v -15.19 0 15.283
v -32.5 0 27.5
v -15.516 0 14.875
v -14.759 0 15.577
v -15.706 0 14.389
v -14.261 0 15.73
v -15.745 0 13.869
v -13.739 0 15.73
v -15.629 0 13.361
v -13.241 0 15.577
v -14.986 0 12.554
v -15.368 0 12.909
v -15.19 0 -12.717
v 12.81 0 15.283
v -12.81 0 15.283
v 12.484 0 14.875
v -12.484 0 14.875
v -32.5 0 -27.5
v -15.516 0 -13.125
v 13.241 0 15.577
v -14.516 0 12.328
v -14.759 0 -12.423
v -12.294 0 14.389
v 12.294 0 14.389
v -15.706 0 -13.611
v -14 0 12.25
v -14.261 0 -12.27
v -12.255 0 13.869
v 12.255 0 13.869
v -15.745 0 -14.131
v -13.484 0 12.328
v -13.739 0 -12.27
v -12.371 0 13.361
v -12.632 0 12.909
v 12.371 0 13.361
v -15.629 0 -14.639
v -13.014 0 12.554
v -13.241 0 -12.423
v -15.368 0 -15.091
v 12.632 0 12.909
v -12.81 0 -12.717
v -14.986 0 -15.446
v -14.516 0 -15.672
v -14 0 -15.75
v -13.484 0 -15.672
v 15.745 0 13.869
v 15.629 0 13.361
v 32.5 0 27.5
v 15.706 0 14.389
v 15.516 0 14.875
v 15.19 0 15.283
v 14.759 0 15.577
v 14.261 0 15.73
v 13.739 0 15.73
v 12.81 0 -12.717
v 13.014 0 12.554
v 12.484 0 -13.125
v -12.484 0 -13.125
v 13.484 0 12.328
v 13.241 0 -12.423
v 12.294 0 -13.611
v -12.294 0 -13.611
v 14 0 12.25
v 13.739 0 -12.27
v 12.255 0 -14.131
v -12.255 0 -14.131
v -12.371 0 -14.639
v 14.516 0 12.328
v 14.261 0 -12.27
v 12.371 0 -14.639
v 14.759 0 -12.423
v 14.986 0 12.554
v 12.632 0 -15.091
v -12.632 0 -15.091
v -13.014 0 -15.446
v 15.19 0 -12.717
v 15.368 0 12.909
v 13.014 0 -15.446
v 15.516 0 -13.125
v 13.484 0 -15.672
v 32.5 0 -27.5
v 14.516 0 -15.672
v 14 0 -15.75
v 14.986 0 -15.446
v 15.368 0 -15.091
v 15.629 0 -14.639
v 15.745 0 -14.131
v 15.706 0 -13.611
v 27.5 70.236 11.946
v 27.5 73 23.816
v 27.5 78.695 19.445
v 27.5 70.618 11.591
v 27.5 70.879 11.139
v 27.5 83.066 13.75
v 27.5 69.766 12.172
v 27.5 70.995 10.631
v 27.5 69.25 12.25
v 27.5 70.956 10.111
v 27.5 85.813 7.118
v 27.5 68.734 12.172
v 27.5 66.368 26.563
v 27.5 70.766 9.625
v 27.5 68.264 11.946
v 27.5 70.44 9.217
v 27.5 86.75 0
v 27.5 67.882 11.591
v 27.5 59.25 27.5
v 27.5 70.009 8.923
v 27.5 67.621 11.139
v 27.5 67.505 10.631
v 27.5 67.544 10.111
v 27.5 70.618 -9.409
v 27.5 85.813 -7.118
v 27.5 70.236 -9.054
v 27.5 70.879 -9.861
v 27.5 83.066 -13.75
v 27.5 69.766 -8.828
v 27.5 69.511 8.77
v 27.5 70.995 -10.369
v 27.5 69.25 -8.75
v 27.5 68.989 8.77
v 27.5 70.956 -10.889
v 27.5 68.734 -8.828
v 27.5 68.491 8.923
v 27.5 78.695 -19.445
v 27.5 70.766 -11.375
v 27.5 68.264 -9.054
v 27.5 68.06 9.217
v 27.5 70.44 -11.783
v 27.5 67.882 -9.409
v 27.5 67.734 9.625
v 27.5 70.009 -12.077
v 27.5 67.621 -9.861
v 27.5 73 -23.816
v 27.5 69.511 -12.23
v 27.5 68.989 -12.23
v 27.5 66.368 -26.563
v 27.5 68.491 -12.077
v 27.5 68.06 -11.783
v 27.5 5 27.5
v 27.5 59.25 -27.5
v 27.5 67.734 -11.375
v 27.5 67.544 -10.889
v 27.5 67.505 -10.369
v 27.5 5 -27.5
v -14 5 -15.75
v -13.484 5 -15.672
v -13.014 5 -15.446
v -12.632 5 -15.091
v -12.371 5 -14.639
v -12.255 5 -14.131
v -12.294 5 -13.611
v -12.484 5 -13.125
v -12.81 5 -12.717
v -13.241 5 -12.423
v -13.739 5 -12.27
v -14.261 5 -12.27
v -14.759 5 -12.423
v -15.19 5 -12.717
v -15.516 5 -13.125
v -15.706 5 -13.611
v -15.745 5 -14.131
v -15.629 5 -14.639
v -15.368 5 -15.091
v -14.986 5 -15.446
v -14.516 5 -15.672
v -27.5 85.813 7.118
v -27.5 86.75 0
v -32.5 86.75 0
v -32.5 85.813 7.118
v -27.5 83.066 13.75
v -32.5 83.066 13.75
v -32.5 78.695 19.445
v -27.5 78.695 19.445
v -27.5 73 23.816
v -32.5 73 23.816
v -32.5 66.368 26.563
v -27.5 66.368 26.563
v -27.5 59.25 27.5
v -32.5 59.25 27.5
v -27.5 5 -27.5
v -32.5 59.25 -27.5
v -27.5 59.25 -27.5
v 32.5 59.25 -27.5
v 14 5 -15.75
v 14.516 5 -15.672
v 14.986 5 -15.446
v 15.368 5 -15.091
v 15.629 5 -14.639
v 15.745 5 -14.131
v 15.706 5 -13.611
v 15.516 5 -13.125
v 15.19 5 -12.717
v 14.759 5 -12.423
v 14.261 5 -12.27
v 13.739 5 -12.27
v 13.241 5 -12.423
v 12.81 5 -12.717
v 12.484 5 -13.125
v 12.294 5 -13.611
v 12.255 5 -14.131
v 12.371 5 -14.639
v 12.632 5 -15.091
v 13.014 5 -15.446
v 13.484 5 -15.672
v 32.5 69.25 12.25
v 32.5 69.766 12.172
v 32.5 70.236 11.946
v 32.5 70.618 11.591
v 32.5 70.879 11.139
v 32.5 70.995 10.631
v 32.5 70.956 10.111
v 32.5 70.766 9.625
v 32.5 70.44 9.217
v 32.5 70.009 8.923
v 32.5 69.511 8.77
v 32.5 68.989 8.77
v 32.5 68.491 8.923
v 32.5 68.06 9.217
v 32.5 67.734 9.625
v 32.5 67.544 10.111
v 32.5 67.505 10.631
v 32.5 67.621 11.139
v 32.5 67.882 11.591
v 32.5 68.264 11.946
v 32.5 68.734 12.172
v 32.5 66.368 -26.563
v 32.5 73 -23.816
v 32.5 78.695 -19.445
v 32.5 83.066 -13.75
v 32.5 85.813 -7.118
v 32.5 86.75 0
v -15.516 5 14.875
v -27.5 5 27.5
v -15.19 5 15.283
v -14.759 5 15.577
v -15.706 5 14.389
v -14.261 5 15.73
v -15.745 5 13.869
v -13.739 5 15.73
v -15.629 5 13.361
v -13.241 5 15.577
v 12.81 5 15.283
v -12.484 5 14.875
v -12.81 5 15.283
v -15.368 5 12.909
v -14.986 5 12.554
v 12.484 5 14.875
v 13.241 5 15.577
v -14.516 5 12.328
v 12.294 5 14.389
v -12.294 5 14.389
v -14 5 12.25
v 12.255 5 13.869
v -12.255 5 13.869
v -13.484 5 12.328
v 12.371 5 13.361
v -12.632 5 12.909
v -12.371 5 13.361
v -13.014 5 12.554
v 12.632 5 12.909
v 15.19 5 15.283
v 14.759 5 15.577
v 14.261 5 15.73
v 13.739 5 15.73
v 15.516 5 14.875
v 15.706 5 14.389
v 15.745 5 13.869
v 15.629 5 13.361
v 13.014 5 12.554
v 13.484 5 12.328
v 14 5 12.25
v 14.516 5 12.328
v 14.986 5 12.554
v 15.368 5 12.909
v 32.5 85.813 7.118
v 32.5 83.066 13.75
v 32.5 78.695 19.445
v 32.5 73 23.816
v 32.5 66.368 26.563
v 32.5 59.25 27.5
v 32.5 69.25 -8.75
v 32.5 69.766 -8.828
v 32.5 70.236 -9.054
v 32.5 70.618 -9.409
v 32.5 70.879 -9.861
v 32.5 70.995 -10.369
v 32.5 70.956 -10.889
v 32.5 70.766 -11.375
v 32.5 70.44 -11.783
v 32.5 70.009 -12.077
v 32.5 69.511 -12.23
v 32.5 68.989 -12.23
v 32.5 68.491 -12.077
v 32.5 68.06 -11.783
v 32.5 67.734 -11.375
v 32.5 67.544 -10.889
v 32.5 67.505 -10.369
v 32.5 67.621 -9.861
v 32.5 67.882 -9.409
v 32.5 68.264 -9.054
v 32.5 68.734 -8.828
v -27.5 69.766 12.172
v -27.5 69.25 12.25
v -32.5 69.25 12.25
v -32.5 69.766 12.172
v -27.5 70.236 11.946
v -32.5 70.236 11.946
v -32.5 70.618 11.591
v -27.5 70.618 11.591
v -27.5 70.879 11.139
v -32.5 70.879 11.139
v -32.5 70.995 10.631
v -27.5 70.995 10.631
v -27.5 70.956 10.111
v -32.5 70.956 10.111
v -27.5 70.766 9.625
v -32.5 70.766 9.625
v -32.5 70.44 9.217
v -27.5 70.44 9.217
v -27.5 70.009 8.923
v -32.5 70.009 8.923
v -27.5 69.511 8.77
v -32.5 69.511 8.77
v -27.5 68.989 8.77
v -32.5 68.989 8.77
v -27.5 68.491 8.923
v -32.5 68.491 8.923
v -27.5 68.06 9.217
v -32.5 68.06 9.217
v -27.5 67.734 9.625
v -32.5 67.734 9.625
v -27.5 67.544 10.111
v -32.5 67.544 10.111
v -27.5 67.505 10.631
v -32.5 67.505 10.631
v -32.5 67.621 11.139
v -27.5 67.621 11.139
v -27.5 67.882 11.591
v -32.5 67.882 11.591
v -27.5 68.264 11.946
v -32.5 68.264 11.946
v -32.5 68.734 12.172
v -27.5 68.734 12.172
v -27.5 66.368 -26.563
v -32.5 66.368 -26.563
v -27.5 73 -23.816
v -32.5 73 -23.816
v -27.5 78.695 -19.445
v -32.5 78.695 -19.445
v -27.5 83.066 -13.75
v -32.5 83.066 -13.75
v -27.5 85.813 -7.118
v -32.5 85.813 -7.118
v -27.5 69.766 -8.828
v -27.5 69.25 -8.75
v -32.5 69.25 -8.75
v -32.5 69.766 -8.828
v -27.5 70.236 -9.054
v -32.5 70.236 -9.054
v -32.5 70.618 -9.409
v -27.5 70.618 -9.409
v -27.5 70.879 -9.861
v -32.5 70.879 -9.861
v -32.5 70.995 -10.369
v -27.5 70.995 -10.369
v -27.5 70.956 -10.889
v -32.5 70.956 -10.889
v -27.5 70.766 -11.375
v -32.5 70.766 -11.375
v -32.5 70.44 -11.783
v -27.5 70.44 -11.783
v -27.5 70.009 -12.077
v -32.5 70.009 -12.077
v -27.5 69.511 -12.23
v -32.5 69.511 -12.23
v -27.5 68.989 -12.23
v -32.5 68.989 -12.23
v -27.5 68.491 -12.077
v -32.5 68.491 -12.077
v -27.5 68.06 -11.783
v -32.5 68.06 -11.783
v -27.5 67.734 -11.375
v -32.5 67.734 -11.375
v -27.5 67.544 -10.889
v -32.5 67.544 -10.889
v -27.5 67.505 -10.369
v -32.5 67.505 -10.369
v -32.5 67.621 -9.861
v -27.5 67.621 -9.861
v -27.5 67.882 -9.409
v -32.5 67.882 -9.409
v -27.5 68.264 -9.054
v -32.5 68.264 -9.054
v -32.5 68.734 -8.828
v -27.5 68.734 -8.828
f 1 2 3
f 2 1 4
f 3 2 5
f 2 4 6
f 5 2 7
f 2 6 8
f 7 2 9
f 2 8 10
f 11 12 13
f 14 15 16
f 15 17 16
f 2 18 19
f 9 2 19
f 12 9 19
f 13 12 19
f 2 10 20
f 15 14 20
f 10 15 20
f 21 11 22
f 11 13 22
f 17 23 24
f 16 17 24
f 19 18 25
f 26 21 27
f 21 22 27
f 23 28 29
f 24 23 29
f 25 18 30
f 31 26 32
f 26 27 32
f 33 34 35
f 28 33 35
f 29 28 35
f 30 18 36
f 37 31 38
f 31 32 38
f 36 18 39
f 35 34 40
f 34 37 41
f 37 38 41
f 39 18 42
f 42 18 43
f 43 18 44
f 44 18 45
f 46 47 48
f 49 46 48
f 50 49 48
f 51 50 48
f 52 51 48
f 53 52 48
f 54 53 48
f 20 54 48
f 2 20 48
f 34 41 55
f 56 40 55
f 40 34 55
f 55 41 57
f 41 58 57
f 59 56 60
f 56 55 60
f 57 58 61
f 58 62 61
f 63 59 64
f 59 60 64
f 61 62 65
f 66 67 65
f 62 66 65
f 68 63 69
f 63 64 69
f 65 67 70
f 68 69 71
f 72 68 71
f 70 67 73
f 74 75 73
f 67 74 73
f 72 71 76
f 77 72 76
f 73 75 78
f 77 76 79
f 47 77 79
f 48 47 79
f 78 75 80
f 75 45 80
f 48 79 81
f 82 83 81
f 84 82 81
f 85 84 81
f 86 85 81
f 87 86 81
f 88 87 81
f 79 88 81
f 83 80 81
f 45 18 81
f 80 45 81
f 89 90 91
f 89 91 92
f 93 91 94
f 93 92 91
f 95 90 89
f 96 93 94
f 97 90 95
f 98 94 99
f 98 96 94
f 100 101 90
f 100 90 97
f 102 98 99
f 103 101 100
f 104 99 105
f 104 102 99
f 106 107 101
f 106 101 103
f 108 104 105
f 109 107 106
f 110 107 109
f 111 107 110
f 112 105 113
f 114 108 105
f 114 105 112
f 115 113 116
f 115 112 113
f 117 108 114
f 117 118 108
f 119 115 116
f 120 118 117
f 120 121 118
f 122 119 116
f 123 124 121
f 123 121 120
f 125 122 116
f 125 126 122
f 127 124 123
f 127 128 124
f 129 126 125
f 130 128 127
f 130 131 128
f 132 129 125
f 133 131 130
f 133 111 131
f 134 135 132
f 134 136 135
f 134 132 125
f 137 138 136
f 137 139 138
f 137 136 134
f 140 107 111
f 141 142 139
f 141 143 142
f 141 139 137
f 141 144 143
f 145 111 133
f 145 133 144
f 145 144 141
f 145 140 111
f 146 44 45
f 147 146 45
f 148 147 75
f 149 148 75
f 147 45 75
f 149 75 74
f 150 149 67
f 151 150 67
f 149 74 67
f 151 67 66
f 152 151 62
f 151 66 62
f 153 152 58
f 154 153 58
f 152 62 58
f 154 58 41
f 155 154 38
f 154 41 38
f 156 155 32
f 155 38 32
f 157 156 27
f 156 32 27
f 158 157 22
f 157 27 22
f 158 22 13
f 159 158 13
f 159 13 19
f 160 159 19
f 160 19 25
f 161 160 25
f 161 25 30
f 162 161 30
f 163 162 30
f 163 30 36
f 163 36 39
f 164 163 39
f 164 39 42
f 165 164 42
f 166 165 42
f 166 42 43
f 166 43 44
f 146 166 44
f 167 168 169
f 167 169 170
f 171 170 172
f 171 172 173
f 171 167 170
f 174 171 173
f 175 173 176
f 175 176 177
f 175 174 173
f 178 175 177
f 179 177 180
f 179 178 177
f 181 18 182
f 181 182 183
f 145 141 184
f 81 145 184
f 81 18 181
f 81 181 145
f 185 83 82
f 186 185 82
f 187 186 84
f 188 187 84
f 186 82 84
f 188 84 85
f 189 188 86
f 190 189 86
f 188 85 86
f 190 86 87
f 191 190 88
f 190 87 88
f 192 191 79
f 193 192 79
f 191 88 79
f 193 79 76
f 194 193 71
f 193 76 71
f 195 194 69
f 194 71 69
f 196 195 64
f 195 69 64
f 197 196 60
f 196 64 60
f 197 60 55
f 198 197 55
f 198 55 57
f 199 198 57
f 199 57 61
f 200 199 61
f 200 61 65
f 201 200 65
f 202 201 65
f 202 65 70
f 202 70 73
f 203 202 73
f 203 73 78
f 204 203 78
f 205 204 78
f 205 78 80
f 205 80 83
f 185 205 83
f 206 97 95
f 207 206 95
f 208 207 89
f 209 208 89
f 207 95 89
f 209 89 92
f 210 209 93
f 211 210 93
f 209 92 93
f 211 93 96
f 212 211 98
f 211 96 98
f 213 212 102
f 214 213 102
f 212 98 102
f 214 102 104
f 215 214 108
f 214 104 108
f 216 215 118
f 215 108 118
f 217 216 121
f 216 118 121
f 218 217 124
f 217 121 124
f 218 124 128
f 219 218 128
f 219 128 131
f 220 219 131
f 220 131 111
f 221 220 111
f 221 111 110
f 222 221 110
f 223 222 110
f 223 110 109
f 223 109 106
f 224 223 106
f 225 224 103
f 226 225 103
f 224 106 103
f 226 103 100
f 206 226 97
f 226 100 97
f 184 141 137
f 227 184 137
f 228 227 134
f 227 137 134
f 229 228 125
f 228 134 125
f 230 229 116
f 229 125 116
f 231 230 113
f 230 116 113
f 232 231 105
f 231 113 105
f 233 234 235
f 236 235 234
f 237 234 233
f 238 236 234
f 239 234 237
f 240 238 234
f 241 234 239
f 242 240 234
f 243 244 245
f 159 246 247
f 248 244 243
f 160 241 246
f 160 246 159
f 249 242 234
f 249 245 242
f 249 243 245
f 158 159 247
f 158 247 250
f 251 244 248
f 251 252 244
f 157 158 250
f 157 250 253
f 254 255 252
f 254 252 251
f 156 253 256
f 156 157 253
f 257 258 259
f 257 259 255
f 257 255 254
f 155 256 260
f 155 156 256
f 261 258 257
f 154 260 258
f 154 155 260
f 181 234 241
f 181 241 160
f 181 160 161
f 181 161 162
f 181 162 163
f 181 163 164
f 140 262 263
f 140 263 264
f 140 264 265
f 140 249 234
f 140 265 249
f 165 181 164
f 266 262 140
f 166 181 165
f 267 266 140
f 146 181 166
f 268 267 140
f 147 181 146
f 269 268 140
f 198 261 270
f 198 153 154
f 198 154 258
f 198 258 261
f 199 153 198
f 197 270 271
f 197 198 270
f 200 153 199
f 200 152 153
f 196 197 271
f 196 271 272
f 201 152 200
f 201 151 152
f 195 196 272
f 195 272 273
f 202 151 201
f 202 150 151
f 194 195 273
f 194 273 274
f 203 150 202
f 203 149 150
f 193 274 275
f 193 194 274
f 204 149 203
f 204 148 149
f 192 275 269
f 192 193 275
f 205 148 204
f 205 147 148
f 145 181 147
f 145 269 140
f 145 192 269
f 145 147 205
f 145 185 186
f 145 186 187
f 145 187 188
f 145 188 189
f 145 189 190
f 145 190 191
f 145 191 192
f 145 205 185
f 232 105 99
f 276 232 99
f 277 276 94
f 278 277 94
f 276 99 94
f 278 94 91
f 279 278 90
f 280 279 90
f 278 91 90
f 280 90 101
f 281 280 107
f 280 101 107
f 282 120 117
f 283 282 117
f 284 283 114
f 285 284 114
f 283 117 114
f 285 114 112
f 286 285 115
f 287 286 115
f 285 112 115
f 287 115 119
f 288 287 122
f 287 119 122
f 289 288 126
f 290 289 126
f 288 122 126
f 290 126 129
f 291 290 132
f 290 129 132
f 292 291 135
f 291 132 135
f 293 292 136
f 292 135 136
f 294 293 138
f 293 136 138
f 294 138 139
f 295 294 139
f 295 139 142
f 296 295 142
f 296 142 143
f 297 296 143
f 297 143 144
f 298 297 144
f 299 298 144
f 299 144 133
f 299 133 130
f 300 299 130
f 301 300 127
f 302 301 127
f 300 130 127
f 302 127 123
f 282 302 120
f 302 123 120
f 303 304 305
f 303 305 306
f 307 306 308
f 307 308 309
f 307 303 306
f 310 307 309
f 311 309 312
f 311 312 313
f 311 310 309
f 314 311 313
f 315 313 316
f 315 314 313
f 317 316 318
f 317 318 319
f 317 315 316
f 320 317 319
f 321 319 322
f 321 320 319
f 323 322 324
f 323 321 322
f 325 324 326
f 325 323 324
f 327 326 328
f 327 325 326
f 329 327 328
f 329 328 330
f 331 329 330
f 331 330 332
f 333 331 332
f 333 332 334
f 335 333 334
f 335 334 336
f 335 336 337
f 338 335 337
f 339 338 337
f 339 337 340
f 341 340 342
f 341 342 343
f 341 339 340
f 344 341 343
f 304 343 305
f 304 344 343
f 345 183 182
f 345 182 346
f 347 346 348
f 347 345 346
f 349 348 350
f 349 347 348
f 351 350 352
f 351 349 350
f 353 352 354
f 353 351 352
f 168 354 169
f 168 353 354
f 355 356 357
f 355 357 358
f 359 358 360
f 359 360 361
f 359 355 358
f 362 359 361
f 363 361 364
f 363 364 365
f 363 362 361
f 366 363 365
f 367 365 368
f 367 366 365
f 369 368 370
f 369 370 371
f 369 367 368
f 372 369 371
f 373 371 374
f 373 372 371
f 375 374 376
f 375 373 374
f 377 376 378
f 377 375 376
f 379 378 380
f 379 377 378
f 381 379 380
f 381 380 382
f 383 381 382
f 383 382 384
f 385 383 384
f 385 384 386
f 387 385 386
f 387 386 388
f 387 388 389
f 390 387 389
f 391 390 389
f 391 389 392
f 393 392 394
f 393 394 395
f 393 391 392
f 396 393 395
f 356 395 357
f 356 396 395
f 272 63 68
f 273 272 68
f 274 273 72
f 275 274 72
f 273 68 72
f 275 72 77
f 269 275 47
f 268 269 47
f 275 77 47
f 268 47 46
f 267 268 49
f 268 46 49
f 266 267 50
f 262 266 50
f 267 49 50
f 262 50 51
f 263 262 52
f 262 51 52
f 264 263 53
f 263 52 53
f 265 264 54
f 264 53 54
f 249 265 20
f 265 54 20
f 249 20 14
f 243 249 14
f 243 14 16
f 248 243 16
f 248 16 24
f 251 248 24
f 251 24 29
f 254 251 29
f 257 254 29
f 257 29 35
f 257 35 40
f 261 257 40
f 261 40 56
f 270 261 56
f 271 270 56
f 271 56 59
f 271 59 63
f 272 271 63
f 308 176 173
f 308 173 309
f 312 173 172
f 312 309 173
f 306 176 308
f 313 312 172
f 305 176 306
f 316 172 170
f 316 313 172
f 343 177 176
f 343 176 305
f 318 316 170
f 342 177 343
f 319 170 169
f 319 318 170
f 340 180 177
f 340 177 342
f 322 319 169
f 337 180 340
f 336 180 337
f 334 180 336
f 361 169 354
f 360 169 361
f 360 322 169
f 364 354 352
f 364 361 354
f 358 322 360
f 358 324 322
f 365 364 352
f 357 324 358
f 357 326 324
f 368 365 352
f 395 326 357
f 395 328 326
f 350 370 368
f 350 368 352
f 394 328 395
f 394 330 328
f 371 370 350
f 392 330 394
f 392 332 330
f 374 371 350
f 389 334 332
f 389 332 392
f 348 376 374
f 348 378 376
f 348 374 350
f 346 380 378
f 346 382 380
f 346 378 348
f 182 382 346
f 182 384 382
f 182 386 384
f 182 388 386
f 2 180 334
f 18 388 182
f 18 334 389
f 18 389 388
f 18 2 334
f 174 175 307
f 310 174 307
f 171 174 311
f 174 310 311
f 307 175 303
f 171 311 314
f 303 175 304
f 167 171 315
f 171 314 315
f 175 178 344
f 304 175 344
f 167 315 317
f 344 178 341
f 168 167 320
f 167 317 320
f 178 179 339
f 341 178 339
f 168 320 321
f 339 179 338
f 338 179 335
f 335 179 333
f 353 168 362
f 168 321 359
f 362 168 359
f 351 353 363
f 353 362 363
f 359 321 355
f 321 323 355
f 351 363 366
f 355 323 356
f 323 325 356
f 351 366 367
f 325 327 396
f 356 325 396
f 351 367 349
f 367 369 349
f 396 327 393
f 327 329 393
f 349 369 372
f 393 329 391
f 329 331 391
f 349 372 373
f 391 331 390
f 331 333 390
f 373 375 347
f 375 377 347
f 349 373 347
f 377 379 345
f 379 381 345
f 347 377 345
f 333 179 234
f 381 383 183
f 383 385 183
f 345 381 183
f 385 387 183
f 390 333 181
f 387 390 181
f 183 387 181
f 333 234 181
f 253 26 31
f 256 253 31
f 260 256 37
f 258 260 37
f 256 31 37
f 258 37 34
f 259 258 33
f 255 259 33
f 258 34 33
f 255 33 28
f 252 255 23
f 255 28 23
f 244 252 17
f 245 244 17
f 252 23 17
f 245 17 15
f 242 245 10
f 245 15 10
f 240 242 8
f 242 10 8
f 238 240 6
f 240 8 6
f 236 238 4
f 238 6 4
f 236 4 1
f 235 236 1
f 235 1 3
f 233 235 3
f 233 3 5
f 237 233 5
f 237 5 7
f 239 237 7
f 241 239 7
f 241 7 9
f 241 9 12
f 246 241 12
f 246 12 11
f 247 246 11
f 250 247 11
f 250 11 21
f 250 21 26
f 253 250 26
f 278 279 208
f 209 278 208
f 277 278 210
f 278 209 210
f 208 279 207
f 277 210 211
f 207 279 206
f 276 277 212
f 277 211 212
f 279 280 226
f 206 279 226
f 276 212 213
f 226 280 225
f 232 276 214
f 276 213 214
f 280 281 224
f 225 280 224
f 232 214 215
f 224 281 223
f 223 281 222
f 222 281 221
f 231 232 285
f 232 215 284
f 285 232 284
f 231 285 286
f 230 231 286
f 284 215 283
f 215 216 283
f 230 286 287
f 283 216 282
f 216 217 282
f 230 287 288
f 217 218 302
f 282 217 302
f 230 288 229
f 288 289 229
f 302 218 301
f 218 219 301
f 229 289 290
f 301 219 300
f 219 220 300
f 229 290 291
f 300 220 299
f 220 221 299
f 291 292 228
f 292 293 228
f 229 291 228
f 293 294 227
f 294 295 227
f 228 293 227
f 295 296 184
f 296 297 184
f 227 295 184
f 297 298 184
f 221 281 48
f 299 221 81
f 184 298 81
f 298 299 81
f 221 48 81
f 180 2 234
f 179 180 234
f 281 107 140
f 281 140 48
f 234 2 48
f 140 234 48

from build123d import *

# Parameters (mm, degrees)
SKETCH1_W           = 65
SKETCH1_H           = 55
BOSS_EXTRUDE1_DEPTH = 5
SKETCH2_W           = 5
SKETCH2_H           = 55
BOSS_EXTRUDE2_DEPTH = 81.75
CUT_EXTRUDE1_REACH  = 113.834
SKETCH3_R           = 1.75
CUT_EXTRUDE2_REACH  = 98.634
SKETCH4_R           = 1.75


with BuildPart() as part:
    # Sketch1 → Boss-Extrude1 (new body)
    with BuildSketch(Plane(origin=(0, 0, 0), x_dir=(1, 0, 0), z_dir=(0, 1, 0))):
        Rectangle(SKETCH1_W, SKETCH1_H)
    extrude(amount=BOSS_EXTRUDE1_DEPTH)

    # Sketch2 → Boss-Extrude2 (add)
    with BuildSketch(Plane(origin=(0, 5, 0), x_dir=(1, 0, 0), z_dir=(0, 1, 0))):
        with Locations((-30, 0)):
            Rectangle(SKETCH2_W, SKETCH2_H)
        with Locations((30, 0)):
            Rectangle(SKETCH2_W, SKETCH2_H)
    extrude(amount=BOSS_EXTRUDE2_DEPTH)

    # Sketch3 → Cut-Extrude1 (cut, up to next)
    with BuildSketch(Plane.ZY.offset(32.5), mode=Mode.PRIVATE) as cut_extrude1_sk1:
        with BuildLine():
            Line((27.5, 86.75), (-2.9e-08, 86.75))
            ThreePointArc((-2.9e-08, 86.75), (19.445436472, 78.695436493), (27.5, 59.25))
            Line((27.5, 59.25), (27.5, 86.75))
        make_face()
    cut_extrude1_tool1 = extrude(cut_extrude1_sk1.sketch, amount=-CUT_EXTRUDE1_REACH, mode=Mode.PRIVATE) & part.part
    # Sketch3 → Cut-Extrude1 (cut, up to next)
    with BuildSketch(Plane.ZY.offset(32.5), mode=Mode.PRIVATE) as cut_extrude1_sk2:
        with BuildLine():
            Line((-2.9e-08, 86.75), (-27.5, 86.75))
            Line((-27.5, 86.75), (-27.5, 59.25))
            ThreePointArc((-27.5, 59.25), (-19.445436493, 78.695436472), (-2.9e-08, 86.75))
        make_face()
    cut_extrude1_tool2 = extrude(cut_extrude1_sk2.sketch, amount=-CUT_EXTRUDE1_REACH, mode=Mode.PRIVATE) & part.part
    # Sketch3 → Cut-Extrude1 (cut, up to next)
    with BuildSketch(Plane.ZY.offset(32.5), mode=Mode.PRIVATE) as cut_extrude1_sk3:
        with Locations((-10.5, 69.25)):
            Circle(SKETCH3_R)
    cut_extrude1_tool3 = extrude(cut_extrude1_sk3.sketch, amount=-CUT_EXTRUDE1_REACH, mode=Mode.PRIVATE) & part.part
    # Sketch3 → Cut-Extrude1 (cut, up to next)
    with BuildSketch(Plane.ZY.offset(32.5), mode=Mode.PRIVATE) as cut_extrude1_sk4:
        with Locations((10.5, 69.25)):
            Circle(SKETCH3_R)
    cut_extrude1_tool4 = extrude(cut_extrude1_sk4.sketch, amount=-CUT_EXTRUDE1_REACH, mode=Mode.PRIVATE) & part.part
    cut_extrude1_1 = cut_extrude1_tool1.solids().sort_by_distance((-32.5, 80.607382, 21.357382))[0]
    add(cut_extrude1_1, mode=Mode.SUBTRACT)
    cut_extrude1_2 = cut_extrude1_tool2.solids().sort_by_distance((-32.5, 80.607382, -21.357382))[0]
    add(cut_extrude1_2, mode=Mode.SUBTRACT)
    cut_extrude1_3 = cut_extrude1_tool3.solids().sort_by_distance((-32.5, 69.25, -10.5))[0]
    add(cut_extrude1_3, mode=Mode.SUBTRACT)
    cut_extrude1_4 = cut_extrude1_tool4.solids().sort_by_distance((-32.5, 69.25, 10.5))[0]
    add(cut_extrude1_4, mode=Mode.SUBTRACT)
    cut_extrude1 = cut_extrude1_1 + cut_extrude1_2 + cut_extrude1_3 + cut_extrude1_4  # Cut-Extrude1 as one shape, for the pattern or mirror that repeats it

    # Mirror1: Cut-Extrude1 across plane
    add(cut_extrude1.mirror(Plane(origin=(0, 0, 0), x_dir=(0, 0, 1), z_dir=(1, 0, 0))), mode=Mode.SUBTRACT)

    # Sketch4 → Cut-Extrude2 (cut, up to next)
    with BuildSketch(Plane.XZ, mode=Mode.PRIVATE) as cut_extrude2_sk1:
        with Locations((-14, 14)):
            Circle(SKETCH4_R)
    cut_extrude2_tool1 = extrude(cut_extrude2_sk1.sketch, amount=-CUT_EXTRUDE2_REACH, mode=Mode.PRIVATE) & part.part
    # Sketch4 → Cut-Extrude2 (cut, up to next)
    with BuildSketch(Plane.XZ, mode=Mode.PRIVATE) as cut_extrude2_sk2:
        with Locations((-14, -14)):
            Circle(SKETCH4_R)
    cut_extrude2_tool2 = extrude(cut_extrude2_sk2.sketch, amount=-CUT_EXTRUDE2_REACH, mode=Mode.PRIVATE) & part.part
    # Sketch4 → Cut-Extrude2 (cut, up to next)
    with BuildSketch(Plane.XZ, mode=Mode.PRIVATE) as cut_extrude2_sk3:
        with Locations((14, -14)):
            Circle(SKETCH4_R)
    cut_extrude2_tool3 = extrude(cut_extrude2_sk3.sketch, amount=-CUT_EXTRUDE2_REACH, mode=Mode.PRIVATE) & part.part
    # Sketch4 → Cut-Extrude2 (cut, up to next)
    with BuildSketch(Plane.XZ, mode=Mode.PRIVATE) as cut_extrude2_sk4:
        with Locations((14, 14)):
            Circle(SKETCH4_R)
    cut_extrude2_tool4 = extrude(cut_extrude2_sk4.sketch, amount=-CUT_EXTRUDE2_REACH, mode=Mode.PRIVATE) & part.part
    add(cut_extrude2_tool1.solids().sort_by_distance((-14, 0, 14))[0], mode=Mode.SUBTRACT)
    add(cut_extrude2_tool2.solids().sort_by_distance((-14, 0, -14))[0], mode=Mode.SUBTRACT)
    add(cut_extrude2_tool3.solids().sort_by_distance((14, 0, -14))[0], mode=Mode.SUBTRACT)
    add(cut_extrude2_tool4.solids().sort_by_distance((14, 0, 14))[0], mode=Mode.SUBTRACT)


solid = part.part
